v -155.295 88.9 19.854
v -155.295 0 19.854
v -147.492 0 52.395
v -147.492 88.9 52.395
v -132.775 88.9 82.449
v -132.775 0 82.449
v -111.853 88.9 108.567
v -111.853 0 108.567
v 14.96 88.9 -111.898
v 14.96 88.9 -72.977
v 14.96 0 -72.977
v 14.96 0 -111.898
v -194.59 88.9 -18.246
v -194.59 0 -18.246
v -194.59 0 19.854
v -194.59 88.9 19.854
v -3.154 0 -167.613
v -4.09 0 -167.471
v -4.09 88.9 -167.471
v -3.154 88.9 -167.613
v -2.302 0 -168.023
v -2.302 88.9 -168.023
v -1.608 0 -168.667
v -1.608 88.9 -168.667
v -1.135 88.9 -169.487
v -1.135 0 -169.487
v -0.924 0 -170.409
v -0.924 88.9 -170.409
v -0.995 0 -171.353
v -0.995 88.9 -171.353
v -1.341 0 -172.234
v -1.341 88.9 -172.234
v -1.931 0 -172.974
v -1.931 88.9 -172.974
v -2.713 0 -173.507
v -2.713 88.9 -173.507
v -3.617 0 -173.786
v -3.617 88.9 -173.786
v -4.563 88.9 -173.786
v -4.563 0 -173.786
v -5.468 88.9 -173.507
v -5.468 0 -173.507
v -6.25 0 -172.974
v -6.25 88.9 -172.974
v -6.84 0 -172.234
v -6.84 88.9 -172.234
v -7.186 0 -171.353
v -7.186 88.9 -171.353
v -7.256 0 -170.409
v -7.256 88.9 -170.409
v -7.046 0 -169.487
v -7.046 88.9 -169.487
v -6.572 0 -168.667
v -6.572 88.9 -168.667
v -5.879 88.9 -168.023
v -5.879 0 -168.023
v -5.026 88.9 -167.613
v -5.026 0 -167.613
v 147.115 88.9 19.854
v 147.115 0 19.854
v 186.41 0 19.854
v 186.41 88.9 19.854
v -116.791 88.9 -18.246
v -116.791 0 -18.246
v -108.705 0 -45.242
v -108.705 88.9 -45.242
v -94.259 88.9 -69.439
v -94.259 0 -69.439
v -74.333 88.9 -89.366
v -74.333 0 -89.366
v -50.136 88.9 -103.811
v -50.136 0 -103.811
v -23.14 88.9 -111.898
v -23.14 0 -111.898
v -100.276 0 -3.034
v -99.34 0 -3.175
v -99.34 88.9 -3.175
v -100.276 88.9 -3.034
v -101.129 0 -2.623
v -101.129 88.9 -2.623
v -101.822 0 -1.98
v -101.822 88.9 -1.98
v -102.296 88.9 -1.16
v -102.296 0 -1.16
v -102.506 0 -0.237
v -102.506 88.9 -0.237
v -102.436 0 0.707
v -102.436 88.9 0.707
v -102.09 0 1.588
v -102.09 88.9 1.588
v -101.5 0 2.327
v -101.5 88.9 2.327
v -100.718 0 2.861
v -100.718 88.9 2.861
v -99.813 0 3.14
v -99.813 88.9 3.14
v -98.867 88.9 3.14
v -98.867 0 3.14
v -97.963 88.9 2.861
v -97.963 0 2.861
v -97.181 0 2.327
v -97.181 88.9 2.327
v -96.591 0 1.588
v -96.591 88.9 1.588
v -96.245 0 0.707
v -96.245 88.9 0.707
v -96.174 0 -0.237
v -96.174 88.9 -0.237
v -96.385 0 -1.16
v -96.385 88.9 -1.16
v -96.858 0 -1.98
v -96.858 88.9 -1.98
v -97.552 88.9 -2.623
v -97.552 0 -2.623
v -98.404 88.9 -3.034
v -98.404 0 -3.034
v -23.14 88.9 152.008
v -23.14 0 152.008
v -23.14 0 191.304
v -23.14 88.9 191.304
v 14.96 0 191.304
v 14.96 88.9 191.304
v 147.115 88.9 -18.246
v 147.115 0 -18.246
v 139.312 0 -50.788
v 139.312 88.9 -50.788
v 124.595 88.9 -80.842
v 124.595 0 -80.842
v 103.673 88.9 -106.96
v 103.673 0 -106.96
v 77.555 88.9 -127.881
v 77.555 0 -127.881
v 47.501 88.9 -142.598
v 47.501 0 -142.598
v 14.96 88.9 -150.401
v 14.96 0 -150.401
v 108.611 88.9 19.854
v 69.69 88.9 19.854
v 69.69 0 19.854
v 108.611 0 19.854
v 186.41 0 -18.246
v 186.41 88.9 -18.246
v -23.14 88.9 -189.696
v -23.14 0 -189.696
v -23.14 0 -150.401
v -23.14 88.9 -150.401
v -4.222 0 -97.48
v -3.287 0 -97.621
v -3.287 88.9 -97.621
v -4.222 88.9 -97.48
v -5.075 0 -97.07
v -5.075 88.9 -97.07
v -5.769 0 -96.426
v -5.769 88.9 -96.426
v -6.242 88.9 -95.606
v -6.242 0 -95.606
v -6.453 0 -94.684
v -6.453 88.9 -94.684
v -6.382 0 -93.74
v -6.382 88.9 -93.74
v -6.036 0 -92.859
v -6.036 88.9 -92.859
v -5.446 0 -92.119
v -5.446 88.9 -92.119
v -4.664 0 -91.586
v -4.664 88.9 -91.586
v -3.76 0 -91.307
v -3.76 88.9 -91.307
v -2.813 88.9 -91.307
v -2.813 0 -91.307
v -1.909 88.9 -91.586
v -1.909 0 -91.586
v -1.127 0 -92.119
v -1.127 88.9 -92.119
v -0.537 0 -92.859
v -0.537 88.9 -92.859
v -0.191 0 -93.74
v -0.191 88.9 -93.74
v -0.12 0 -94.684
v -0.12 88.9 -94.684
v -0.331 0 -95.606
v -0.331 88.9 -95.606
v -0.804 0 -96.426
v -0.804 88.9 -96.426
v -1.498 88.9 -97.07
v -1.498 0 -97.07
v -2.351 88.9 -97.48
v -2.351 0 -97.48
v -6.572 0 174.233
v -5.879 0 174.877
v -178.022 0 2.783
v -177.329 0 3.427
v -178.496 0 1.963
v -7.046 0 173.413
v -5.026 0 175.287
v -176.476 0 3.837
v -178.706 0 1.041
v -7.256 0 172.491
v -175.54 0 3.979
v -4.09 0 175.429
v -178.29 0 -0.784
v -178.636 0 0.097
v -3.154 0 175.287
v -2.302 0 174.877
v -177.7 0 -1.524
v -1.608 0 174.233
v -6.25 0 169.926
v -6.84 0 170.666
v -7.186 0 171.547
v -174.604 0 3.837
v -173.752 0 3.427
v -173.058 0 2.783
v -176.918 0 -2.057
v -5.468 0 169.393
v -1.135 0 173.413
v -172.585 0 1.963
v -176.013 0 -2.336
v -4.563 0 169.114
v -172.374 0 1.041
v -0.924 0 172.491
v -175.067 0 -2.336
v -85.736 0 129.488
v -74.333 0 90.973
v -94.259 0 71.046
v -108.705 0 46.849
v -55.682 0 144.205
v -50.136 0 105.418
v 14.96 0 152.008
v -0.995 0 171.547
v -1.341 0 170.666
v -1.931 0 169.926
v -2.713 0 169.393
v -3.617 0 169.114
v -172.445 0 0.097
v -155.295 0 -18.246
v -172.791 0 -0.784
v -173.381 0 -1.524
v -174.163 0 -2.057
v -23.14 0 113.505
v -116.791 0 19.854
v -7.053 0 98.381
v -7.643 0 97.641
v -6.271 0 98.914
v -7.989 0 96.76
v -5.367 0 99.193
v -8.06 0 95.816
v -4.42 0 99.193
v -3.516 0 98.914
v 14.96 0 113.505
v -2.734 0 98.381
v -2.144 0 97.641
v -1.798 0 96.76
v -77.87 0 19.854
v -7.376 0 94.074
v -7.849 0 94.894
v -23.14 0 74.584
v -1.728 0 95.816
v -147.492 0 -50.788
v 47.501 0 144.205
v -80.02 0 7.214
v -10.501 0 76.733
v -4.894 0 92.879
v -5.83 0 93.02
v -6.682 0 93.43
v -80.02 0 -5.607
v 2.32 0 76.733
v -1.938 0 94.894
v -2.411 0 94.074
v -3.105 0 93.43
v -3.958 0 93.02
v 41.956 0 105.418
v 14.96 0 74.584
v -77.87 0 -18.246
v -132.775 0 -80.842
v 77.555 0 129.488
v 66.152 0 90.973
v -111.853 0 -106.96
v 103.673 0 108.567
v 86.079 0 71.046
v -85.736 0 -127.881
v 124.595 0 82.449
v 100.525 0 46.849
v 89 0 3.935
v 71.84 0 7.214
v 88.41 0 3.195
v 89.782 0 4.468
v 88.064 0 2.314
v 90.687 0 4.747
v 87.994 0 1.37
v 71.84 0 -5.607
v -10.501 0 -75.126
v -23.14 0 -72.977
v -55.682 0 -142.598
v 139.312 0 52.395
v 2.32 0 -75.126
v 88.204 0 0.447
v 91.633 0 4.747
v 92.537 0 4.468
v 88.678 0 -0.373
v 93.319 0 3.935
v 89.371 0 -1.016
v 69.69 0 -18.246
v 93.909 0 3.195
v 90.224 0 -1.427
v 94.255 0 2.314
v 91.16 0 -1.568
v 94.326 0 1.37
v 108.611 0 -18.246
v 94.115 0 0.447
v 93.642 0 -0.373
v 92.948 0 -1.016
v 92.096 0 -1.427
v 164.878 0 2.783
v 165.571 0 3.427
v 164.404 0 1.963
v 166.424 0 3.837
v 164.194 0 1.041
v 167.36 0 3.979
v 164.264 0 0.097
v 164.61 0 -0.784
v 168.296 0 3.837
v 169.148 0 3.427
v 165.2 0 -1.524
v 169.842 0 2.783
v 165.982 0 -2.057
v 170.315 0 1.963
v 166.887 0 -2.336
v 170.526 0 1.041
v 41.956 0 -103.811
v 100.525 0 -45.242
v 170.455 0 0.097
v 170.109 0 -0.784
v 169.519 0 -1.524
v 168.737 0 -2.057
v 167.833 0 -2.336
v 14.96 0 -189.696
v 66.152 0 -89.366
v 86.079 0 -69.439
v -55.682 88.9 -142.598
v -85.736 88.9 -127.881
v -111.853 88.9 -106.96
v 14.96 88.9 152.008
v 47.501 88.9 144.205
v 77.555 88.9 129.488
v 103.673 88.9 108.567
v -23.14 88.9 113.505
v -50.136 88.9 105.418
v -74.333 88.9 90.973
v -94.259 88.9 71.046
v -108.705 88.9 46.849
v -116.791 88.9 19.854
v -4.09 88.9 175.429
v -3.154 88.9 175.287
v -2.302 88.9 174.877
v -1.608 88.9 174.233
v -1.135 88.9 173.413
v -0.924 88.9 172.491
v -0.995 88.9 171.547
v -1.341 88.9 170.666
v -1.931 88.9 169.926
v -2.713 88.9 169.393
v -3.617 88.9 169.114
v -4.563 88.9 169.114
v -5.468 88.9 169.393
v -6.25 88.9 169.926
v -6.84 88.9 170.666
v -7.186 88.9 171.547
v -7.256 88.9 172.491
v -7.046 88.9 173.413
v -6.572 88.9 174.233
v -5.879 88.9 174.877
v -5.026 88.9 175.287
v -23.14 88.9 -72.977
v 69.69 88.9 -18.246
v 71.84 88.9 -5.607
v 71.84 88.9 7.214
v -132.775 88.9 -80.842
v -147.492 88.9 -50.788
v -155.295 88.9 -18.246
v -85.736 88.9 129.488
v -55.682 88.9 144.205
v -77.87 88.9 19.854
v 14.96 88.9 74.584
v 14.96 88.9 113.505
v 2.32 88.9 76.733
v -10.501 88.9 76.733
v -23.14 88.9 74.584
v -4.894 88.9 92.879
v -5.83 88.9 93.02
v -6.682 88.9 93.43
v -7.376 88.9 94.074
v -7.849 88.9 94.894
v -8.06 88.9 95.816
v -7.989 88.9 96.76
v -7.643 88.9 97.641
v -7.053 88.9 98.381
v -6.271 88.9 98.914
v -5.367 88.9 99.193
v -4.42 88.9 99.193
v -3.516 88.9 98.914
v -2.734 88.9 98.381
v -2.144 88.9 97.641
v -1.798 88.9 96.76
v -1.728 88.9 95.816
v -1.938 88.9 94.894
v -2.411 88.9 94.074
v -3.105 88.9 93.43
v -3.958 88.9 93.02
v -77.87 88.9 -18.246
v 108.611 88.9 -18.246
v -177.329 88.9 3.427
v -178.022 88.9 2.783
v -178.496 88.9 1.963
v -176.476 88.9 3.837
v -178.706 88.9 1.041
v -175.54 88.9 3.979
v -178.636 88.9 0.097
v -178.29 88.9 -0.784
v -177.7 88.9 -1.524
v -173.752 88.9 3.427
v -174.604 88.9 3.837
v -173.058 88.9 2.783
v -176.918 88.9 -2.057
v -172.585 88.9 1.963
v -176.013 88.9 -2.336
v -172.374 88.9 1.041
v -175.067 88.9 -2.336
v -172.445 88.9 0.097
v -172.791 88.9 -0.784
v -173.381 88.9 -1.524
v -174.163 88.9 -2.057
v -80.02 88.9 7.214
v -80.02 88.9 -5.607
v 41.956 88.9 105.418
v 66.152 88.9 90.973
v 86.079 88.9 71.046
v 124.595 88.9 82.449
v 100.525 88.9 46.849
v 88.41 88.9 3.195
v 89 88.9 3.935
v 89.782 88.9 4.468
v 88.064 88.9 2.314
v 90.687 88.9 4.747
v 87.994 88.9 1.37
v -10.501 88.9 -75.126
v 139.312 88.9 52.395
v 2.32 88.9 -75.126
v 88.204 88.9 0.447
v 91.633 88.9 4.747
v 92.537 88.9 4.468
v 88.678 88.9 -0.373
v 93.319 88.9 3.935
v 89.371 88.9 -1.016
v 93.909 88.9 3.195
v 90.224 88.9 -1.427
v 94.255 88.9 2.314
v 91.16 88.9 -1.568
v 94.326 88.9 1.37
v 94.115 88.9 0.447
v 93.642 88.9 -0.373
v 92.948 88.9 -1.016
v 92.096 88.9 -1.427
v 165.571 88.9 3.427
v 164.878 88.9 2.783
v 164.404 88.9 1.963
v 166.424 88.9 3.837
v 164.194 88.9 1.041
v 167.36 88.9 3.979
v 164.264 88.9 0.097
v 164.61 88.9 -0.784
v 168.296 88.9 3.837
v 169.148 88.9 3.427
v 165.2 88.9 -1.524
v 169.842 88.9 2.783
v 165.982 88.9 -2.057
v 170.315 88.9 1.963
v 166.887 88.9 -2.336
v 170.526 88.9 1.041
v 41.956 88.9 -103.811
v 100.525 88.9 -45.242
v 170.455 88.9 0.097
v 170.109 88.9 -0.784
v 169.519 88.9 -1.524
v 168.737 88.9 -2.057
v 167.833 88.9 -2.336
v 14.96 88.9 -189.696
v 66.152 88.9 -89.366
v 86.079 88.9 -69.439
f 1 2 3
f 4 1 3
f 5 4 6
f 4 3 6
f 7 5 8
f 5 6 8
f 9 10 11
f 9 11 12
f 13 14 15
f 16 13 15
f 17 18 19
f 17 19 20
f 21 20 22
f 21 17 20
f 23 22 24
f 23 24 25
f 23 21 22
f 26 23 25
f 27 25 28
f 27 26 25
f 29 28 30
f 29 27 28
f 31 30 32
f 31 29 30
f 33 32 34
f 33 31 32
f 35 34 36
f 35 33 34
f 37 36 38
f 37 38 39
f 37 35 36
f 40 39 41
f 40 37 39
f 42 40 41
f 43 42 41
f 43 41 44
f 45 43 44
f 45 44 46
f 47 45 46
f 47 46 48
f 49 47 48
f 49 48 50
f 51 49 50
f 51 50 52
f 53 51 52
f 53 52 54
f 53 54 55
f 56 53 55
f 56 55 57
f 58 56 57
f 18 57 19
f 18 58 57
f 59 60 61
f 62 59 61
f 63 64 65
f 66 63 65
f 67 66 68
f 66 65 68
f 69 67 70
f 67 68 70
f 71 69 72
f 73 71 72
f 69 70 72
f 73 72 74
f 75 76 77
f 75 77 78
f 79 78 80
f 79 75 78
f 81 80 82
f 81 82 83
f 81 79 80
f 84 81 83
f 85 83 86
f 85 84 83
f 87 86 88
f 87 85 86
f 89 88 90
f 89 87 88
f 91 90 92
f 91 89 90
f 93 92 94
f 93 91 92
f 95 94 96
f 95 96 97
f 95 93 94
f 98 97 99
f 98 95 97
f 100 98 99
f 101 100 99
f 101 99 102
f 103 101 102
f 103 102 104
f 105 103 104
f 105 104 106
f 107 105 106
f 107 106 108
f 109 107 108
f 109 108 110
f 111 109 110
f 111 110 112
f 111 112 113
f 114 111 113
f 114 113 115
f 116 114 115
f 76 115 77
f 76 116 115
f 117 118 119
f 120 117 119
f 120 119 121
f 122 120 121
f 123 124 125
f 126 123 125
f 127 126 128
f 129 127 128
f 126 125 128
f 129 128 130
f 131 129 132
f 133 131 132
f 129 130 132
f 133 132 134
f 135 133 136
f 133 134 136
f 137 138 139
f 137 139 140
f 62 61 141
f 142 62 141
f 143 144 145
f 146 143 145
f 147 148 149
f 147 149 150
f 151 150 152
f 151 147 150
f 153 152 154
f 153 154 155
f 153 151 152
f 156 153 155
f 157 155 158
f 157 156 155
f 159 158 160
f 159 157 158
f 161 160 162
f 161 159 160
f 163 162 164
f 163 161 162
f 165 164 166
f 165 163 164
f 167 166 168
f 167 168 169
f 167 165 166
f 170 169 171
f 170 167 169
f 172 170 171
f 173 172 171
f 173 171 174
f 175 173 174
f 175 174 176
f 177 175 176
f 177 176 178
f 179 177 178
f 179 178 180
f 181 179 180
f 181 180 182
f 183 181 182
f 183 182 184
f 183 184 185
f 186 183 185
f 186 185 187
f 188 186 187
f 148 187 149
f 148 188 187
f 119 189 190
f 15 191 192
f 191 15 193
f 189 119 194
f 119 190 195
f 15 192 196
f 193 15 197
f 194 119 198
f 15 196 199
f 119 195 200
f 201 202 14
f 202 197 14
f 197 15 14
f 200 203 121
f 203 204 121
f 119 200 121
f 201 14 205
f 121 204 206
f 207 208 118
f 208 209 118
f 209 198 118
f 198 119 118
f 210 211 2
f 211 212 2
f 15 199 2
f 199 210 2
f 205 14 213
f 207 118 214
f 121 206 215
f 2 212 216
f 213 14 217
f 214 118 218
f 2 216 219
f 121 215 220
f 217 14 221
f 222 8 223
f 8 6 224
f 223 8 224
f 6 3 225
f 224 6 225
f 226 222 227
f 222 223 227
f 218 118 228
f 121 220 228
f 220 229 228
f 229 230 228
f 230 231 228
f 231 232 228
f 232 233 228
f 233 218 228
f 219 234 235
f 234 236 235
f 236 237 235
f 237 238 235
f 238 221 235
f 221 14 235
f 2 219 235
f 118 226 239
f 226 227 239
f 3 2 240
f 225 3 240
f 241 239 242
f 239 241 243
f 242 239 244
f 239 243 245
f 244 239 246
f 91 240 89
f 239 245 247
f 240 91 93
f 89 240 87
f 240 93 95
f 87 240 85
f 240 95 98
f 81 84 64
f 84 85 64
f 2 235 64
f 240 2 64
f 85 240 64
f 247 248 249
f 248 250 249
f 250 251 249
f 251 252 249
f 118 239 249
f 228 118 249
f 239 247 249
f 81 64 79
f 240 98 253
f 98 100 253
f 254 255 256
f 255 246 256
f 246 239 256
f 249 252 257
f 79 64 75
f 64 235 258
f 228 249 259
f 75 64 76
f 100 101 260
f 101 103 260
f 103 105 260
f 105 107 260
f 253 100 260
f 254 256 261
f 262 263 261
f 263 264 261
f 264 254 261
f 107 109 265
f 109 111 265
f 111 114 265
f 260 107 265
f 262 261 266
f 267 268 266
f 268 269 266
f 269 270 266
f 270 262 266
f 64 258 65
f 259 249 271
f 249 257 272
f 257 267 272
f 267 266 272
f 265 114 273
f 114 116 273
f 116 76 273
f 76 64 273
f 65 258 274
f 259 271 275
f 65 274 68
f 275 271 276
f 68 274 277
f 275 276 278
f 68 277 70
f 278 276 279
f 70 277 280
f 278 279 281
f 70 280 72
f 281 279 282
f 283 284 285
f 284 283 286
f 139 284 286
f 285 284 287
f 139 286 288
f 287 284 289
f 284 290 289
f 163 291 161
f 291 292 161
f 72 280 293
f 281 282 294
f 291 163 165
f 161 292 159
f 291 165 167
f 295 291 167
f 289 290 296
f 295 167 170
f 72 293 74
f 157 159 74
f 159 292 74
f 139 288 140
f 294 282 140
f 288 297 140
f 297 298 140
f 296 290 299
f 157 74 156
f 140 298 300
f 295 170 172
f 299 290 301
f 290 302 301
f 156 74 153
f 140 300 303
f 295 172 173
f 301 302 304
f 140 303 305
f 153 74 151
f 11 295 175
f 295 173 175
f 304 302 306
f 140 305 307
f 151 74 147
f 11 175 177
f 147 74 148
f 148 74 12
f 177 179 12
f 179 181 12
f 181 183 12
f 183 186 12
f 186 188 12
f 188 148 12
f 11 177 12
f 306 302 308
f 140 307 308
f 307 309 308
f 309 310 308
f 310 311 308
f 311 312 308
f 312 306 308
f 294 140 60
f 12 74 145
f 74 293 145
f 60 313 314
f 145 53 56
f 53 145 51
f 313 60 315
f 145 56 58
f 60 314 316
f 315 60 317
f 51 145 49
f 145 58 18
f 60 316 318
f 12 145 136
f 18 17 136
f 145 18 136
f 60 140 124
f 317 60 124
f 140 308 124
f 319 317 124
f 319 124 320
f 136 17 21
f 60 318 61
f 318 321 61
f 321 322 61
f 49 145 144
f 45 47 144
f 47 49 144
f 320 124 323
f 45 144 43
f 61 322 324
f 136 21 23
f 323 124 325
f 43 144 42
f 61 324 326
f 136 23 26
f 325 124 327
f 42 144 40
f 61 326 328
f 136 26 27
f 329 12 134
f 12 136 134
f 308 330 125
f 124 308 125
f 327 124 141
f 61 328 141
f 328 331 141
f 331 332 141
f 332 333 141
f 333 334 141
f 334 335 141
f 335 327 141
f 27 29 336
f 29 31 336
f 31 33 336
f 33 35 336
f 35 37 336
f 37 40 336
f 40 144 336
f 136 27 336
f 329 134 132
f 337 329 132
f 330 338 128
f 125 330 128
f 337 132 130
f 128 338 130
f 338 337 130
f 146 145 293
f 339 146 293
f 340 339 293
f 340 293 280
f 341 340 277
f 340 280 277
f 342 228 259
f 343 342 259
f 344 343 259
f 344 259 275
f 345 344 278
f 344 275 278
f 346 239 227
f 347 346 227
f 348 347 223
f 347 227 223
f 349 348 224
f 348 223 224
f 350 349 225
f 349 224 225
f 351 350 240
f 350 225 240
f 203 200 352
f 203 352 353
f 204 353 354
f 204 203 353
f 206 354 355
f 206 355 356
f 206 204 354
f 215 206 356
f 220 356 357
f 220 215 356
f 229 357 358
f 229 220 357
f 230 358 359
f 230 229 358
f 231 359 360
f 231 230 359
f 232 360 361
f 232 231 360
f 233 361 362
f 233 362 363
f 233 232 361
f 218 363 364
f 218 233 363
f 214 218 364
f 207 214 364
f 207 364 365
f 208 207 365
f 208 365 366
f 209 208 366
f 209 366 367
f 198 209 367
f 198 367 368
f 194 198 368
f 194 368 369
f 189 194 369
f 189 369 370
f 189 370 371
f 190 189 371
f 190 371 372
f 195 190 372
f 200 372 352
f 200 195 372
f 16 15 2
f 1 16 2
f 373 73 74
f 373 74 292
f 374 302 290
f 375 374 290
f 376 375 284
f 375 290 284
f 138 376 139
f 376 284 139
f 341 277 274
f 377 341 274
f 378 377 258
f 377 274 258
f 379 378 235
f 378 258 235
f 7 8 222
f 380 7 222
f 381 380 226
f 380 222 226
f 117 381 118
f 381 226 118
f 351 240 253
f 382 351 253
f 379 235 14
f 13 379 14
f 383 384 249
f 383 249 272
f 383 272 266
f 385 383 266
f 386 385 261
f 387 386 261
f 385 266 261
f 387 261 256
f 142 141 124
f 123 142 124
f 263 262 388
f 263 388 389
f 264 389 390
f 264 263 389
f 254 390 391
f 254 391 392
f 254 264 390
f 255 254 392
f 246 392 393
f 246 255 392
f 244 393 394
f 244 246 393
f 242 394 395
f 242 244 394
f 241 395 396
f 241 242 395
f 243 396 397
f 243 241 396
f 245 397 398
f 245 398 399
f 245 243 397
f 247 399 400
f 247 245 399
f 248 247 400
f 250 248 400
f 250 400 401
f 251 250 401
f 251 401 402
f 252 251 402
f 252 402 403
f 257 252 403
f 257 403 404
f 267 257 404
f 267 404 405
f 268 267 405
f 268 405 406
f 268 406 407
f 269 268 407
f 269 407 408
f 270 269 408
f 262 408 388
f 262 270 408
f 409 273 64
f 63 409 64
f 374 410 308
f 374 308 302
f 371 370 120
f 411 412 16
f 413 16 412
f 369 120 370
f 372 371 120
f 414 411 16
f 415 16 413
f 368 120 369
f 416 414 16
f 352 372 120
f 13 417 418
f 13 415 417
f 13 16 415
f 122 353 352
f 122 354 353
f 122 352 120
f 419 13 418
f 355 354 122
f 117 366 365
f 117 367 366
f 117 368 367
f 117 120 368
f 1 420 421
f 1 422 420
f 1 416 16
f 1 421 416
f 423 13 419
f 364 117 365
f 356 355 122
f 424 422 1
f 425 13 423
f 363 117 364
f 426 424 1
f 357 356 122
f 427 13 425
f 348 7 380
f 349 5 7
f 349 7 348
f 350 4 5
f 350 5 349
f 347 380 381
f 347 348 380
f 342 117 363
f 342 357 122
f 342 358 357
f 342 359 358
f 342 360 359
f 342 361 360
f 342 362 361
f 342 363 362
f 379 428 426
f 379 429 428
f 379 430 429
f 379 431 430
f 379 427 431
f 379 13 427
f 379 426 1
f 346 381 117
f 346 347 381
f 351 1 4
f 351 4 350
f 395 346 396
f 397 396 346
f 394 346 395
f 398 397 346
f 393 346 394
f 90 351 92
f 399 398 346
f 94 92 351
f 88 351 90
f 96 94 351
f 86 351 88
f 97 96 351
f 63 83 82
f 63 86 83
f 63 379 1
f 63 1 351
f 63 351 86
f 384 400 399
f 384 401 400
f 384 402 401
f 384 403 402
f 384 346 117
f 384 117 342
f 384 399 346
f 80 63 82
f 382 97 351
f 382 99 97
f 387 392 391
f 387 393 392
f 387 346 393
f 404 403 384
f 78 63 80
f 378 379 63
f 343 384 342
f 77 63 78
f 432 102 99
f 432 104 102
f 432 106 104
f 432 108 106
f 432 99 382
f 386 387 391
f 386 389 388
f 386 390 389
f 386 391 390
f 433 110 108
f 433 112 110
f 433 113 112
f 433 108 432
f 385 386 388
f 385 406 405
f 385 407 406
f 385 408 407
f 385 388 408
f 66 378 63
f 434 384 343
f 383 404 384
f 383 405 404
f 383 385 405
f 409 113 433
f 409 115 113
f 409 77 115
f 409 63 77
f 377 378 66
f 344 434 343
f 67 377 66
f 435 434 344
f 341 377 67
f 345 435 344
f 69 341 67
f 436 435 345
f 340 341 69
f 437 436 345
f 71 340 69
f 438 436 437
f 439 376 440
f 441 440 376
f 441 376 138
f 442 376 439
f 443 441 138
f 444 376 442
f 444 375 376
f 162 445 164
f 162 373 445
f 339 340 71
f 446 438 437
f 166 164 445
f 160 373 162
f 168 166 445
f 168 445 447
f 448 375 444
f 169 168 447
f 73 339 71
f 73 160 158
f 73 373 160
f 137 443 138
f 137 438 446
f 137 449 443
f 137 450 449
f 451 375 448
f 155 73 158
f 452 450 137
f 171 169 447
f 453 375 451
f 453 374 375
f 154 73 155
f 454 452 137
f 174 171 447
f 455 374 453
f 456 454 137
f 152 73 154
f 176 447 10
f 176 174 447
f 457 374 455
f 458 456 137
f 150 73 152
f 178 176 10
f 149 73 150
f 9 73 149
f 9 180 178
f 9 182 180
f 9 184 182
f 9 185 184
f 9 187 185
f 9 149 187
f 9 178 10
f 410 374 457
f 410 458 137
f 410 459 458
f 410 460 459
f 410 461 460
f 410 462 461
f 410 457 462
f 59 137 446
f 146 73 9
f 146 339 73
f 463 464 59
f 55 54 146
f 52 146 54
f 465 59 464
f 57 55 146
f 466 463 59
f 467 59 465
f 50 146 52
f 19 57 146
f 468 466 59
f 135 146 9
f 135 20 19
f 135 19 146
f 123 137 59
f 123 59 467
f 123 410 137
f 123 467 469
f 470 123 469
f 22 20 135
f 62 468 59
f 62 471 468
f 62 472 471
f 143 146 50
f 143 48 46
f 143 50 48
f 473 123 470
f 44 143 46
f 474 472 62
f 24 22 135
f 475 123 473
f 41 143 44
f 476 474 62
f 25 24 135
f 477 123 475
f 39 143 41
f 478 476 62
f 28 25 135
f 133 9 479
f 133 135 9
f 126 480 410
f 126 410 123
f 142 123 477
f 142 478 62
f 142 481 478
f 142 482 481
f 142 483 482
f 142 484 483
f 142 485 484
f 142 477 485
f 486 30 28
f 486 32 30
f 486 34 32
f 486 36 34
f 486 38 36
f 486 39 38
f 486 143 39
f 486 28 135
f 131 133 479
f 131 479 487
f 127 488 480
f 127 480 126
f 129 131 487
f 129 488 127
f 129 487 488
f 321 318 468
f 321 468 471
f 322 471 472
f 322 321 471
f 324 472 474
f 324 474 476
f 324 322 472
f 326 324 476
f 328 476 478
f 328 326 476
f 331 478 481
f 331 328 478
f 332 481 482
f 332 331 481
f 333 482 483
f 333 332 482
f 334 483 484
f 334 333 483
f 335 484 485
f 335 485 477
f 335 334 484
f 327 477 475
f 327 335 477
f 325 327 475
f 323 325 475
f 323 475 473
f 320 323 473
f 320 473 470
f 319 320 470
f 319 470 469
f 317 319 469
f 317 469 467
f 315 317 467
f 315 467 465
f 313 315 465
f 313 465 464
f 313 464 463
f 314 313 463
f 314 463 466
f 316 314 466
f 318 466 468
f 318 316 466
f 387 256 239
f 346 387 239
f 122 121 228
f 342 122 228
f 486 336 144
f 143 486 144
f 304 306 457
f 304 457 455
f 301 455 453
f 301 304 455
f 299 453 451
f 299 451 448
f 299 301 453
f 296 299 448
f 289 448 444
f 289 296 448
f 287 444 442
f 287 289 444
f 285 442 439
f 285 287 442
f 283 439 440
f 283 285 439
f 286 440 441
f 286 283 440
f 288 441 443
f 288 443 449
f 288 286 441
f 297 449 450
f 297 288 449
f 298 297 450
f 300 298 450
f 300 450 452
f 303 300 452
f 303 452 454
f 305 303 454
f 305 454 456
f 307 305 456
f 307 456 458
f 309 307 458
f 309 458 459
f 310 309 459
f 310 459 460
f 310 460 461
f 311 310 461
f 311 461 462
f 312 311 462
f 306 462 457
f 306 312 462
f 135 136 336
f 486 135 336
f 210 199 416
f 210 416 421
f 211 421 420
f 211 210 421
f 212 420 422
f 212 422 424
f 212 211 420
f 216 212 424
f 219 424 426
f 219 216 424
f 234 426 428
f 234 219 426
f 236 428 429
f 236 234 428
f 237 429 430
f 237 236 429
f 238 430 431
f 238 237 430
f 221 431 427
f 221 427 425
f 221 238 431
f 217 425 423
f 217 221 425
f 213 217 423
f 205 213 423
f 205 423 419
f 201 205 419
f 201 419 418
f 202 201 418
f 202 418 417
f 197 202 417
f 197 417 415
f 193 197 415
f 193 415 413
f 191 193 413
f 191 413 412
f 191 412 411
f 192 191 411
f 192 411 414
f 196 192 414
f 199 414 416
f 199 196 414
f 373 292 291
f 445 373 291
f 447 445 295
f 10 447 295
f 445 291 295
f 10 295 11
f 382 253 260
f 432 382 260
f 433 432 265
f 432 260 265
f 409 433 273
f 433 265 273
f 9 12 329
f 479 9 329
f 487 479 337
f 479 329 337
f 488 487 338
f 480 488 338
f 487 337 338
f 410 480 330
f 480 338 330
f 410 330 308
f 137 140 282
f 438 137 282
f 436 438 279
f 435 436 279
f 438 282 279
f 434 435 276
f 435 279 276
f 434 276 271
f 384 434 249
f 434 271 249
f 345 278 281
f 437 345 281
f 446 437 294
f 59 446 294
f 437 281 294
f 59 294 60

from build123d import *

# Parameters (mm, degrees)
SKETCH_1_R      = 3.175
EXTRUDE_1_DEPTH = 88.9


with BuildPart() as part:
    # Эскиз1 → Бобышка-Вытянуть1 (new body)
    with BuildSketch(Plane(origin=(0, 0, 0), x_dir=(1, 0, 0), z_dir=(0, 1, 0))):
        with BuildLine():
            Line((-194.590147989, 18.24646839), (-194.590147989, -19.85353161))
            Line((-194.590147989, -19.85353161), (-155.294835417, -19.85353161))
            ThreePointArc((-155.294835417, -19.85353161), (-140.960808265, -67.827276327), (-111.853221442, -108.566605063))
            ThreePointArc((-111.853221442, -108.566605063), (-71.113892706, -137.674191886), (-23.140147989, -152.008219038))
            Line((-23.140147989, -152.008219038), (-23.140147989, -191.30353161))
            Line((-23.140147989, -191.30353161), (14.959852011, -191.30353161))
            Line((14.959852011, -191.30353161), (14.959852011, -152.008219038))
            ThreePointArc((14.959852011, -152.008219038), (62.933596727, -137.674191886), (103.672925464, -108.566605063))
            ThreePointArc((103.672925464, -108.566605063), (132.780512286, -67.827276327), (147.114539438, -19.85353161))
            Line((147.114539438, -19.85353161), (186.409852011, -19.85353161))
            Line((186.409852011, -19.85353161), (186.409852011, 18.24646839))
            Line((186.409852011, 18.24646839), (147.114539438, 18.24646839))
            ThreePointArc((147.114539438, 18.24646839), (132.780512286, 66.220213106), (103.672925464, 106.959541842))
            ThreePointArc((103.672925464, 106.959541842), (62.933596727, 136.067128665), (14.959852011, 150.401155817))
            Line((14.959852011, 150.401155817), (14.959852011, 189.69646839))
            Line((14.959852011, 189.69646839), (-23.140147989, 189.69646839))
            Line((-23.140147989, 189.69646839), (-23.140147989, 150.401155817))
            ThreePointArc((-23.140147989, 150.401155817), (-71.113892706, 136.067128665), (-111.853221442, 106.959541842))
            ThreePointArc((-111.853221442, 106.959541842), (-140.960808265, 66.220213106), (-155.294835417, 18.24646839))
            Line((-155.294835417, 18.24646839), (-194.590147989, 18.24646839))
        make_face()
        with Locations(Location((-175.540147989, -0.80353161, 0), (0, 0, 270))):
            Circle(SKETCH_1_R, mode=Mode.SUBTRACT)
        with Locations(Location((-99.340147989, 0, 0), (0, 0, 90))):
            Circle(SKETCH_1_R, mode=Mode.SUBTRACT)
        with Locations(Location((-4.090147989, 170.64646839, 0), (0, 0, 270))):
            Circle(SKETCH_1_R, mode=Mode.SUBTRACT)
        with Locations(Location((-3.286616379, 94.44646839, 0), (0, 0, 90))):
            Circle(SKETCH_1_R, mode=Mode.SUBTRACT)
        with Locations(Location((167.359852011, -0.80353161, 0), (0, 0, 270))):
            Circle(SKETCH_1_R, mode=Mode.SUBTRACT)
        with Locations(Location((91.159852011, -1.607063221, 0), (0, 0, 90))):
            Circle(SKETCH_1_R, mode=Mode.SUBTRACT)
        with Locations(Location((-4.090147989, -172.25353161, 0), (0, 0, 270))):
            Circle(SKETCH_1_R, mode=Mode.SUBTRACT)
        with Locations(Location((-4.8936796, -96.05353161, 0), (0, 0, 90))):
            Circle(SKETCH_1_R, mode=Mode.SUBTRACT)
        with BuildLine():
            Line((-77.870480735, 18.24646839), (-116.791467857, 18.24646839))
            ThreePointArc((-116.791467857, 18.24646839), (-84.912453079, 80.018773479), (-23.140147989, 111.897788258))
            Line((-23.140147989, 111.897788258), (-23.140147989, 72.976801135))
            ThreePointArc((-23.140147989, 72.976801135), (-4.090147989, 75.39646839), (14.959852011, 72.976801135))
            Line((14.959852011, 72.976801135), (14.959852011, 111.897788258))
            ThreePointArc((14.959852011, 111.897788258), (76.7321571, 80.018773479), (108.611171879, 18.24646839))
            Line((108.611171879, 18.24646839), (69.690184756, 18.24646839))
            ThreePointArc((69.690184756, 18.24646839), (72.109852011, -0.80353161), (69.690184756, -19.85353161))
            Line((69.690184756, -19.85353161), (108.611171879, -19.85353161))
            ThreePointArc((108.611171879, -19.85353161), (76.7321571, -81.6258367), (14.959852011, -113.504851478))
            Line((14.959852011, -113.504851478), (14.959852011, -74.583864356))
            ThreePointArc((14.959852011, -74.583864356), (-4.090147989, -77.00353161), (-23.140147989, -74.583864356))
            Line((-23.140147989, -74.583864356), (-23.140147989, -113.504851478))
            ThreePointArc((-23.140147989, -113.504851478), (-84.912453079, -81.6258367), (-116.791467857, -19.85353161))
            Line((-116.791467857, -19.85353161), (-77.870480735, -19.85353161))
            ThreePointArc((-77.870480735, -19.85353161), (-80.290147989, -0.80353161), (-77.870480735, 18.24646839))
        make_face(mode=Mode.SUBTRACT)
    extrude(amount=EXTRUDE_1_DEPTH)


solid = part.part
